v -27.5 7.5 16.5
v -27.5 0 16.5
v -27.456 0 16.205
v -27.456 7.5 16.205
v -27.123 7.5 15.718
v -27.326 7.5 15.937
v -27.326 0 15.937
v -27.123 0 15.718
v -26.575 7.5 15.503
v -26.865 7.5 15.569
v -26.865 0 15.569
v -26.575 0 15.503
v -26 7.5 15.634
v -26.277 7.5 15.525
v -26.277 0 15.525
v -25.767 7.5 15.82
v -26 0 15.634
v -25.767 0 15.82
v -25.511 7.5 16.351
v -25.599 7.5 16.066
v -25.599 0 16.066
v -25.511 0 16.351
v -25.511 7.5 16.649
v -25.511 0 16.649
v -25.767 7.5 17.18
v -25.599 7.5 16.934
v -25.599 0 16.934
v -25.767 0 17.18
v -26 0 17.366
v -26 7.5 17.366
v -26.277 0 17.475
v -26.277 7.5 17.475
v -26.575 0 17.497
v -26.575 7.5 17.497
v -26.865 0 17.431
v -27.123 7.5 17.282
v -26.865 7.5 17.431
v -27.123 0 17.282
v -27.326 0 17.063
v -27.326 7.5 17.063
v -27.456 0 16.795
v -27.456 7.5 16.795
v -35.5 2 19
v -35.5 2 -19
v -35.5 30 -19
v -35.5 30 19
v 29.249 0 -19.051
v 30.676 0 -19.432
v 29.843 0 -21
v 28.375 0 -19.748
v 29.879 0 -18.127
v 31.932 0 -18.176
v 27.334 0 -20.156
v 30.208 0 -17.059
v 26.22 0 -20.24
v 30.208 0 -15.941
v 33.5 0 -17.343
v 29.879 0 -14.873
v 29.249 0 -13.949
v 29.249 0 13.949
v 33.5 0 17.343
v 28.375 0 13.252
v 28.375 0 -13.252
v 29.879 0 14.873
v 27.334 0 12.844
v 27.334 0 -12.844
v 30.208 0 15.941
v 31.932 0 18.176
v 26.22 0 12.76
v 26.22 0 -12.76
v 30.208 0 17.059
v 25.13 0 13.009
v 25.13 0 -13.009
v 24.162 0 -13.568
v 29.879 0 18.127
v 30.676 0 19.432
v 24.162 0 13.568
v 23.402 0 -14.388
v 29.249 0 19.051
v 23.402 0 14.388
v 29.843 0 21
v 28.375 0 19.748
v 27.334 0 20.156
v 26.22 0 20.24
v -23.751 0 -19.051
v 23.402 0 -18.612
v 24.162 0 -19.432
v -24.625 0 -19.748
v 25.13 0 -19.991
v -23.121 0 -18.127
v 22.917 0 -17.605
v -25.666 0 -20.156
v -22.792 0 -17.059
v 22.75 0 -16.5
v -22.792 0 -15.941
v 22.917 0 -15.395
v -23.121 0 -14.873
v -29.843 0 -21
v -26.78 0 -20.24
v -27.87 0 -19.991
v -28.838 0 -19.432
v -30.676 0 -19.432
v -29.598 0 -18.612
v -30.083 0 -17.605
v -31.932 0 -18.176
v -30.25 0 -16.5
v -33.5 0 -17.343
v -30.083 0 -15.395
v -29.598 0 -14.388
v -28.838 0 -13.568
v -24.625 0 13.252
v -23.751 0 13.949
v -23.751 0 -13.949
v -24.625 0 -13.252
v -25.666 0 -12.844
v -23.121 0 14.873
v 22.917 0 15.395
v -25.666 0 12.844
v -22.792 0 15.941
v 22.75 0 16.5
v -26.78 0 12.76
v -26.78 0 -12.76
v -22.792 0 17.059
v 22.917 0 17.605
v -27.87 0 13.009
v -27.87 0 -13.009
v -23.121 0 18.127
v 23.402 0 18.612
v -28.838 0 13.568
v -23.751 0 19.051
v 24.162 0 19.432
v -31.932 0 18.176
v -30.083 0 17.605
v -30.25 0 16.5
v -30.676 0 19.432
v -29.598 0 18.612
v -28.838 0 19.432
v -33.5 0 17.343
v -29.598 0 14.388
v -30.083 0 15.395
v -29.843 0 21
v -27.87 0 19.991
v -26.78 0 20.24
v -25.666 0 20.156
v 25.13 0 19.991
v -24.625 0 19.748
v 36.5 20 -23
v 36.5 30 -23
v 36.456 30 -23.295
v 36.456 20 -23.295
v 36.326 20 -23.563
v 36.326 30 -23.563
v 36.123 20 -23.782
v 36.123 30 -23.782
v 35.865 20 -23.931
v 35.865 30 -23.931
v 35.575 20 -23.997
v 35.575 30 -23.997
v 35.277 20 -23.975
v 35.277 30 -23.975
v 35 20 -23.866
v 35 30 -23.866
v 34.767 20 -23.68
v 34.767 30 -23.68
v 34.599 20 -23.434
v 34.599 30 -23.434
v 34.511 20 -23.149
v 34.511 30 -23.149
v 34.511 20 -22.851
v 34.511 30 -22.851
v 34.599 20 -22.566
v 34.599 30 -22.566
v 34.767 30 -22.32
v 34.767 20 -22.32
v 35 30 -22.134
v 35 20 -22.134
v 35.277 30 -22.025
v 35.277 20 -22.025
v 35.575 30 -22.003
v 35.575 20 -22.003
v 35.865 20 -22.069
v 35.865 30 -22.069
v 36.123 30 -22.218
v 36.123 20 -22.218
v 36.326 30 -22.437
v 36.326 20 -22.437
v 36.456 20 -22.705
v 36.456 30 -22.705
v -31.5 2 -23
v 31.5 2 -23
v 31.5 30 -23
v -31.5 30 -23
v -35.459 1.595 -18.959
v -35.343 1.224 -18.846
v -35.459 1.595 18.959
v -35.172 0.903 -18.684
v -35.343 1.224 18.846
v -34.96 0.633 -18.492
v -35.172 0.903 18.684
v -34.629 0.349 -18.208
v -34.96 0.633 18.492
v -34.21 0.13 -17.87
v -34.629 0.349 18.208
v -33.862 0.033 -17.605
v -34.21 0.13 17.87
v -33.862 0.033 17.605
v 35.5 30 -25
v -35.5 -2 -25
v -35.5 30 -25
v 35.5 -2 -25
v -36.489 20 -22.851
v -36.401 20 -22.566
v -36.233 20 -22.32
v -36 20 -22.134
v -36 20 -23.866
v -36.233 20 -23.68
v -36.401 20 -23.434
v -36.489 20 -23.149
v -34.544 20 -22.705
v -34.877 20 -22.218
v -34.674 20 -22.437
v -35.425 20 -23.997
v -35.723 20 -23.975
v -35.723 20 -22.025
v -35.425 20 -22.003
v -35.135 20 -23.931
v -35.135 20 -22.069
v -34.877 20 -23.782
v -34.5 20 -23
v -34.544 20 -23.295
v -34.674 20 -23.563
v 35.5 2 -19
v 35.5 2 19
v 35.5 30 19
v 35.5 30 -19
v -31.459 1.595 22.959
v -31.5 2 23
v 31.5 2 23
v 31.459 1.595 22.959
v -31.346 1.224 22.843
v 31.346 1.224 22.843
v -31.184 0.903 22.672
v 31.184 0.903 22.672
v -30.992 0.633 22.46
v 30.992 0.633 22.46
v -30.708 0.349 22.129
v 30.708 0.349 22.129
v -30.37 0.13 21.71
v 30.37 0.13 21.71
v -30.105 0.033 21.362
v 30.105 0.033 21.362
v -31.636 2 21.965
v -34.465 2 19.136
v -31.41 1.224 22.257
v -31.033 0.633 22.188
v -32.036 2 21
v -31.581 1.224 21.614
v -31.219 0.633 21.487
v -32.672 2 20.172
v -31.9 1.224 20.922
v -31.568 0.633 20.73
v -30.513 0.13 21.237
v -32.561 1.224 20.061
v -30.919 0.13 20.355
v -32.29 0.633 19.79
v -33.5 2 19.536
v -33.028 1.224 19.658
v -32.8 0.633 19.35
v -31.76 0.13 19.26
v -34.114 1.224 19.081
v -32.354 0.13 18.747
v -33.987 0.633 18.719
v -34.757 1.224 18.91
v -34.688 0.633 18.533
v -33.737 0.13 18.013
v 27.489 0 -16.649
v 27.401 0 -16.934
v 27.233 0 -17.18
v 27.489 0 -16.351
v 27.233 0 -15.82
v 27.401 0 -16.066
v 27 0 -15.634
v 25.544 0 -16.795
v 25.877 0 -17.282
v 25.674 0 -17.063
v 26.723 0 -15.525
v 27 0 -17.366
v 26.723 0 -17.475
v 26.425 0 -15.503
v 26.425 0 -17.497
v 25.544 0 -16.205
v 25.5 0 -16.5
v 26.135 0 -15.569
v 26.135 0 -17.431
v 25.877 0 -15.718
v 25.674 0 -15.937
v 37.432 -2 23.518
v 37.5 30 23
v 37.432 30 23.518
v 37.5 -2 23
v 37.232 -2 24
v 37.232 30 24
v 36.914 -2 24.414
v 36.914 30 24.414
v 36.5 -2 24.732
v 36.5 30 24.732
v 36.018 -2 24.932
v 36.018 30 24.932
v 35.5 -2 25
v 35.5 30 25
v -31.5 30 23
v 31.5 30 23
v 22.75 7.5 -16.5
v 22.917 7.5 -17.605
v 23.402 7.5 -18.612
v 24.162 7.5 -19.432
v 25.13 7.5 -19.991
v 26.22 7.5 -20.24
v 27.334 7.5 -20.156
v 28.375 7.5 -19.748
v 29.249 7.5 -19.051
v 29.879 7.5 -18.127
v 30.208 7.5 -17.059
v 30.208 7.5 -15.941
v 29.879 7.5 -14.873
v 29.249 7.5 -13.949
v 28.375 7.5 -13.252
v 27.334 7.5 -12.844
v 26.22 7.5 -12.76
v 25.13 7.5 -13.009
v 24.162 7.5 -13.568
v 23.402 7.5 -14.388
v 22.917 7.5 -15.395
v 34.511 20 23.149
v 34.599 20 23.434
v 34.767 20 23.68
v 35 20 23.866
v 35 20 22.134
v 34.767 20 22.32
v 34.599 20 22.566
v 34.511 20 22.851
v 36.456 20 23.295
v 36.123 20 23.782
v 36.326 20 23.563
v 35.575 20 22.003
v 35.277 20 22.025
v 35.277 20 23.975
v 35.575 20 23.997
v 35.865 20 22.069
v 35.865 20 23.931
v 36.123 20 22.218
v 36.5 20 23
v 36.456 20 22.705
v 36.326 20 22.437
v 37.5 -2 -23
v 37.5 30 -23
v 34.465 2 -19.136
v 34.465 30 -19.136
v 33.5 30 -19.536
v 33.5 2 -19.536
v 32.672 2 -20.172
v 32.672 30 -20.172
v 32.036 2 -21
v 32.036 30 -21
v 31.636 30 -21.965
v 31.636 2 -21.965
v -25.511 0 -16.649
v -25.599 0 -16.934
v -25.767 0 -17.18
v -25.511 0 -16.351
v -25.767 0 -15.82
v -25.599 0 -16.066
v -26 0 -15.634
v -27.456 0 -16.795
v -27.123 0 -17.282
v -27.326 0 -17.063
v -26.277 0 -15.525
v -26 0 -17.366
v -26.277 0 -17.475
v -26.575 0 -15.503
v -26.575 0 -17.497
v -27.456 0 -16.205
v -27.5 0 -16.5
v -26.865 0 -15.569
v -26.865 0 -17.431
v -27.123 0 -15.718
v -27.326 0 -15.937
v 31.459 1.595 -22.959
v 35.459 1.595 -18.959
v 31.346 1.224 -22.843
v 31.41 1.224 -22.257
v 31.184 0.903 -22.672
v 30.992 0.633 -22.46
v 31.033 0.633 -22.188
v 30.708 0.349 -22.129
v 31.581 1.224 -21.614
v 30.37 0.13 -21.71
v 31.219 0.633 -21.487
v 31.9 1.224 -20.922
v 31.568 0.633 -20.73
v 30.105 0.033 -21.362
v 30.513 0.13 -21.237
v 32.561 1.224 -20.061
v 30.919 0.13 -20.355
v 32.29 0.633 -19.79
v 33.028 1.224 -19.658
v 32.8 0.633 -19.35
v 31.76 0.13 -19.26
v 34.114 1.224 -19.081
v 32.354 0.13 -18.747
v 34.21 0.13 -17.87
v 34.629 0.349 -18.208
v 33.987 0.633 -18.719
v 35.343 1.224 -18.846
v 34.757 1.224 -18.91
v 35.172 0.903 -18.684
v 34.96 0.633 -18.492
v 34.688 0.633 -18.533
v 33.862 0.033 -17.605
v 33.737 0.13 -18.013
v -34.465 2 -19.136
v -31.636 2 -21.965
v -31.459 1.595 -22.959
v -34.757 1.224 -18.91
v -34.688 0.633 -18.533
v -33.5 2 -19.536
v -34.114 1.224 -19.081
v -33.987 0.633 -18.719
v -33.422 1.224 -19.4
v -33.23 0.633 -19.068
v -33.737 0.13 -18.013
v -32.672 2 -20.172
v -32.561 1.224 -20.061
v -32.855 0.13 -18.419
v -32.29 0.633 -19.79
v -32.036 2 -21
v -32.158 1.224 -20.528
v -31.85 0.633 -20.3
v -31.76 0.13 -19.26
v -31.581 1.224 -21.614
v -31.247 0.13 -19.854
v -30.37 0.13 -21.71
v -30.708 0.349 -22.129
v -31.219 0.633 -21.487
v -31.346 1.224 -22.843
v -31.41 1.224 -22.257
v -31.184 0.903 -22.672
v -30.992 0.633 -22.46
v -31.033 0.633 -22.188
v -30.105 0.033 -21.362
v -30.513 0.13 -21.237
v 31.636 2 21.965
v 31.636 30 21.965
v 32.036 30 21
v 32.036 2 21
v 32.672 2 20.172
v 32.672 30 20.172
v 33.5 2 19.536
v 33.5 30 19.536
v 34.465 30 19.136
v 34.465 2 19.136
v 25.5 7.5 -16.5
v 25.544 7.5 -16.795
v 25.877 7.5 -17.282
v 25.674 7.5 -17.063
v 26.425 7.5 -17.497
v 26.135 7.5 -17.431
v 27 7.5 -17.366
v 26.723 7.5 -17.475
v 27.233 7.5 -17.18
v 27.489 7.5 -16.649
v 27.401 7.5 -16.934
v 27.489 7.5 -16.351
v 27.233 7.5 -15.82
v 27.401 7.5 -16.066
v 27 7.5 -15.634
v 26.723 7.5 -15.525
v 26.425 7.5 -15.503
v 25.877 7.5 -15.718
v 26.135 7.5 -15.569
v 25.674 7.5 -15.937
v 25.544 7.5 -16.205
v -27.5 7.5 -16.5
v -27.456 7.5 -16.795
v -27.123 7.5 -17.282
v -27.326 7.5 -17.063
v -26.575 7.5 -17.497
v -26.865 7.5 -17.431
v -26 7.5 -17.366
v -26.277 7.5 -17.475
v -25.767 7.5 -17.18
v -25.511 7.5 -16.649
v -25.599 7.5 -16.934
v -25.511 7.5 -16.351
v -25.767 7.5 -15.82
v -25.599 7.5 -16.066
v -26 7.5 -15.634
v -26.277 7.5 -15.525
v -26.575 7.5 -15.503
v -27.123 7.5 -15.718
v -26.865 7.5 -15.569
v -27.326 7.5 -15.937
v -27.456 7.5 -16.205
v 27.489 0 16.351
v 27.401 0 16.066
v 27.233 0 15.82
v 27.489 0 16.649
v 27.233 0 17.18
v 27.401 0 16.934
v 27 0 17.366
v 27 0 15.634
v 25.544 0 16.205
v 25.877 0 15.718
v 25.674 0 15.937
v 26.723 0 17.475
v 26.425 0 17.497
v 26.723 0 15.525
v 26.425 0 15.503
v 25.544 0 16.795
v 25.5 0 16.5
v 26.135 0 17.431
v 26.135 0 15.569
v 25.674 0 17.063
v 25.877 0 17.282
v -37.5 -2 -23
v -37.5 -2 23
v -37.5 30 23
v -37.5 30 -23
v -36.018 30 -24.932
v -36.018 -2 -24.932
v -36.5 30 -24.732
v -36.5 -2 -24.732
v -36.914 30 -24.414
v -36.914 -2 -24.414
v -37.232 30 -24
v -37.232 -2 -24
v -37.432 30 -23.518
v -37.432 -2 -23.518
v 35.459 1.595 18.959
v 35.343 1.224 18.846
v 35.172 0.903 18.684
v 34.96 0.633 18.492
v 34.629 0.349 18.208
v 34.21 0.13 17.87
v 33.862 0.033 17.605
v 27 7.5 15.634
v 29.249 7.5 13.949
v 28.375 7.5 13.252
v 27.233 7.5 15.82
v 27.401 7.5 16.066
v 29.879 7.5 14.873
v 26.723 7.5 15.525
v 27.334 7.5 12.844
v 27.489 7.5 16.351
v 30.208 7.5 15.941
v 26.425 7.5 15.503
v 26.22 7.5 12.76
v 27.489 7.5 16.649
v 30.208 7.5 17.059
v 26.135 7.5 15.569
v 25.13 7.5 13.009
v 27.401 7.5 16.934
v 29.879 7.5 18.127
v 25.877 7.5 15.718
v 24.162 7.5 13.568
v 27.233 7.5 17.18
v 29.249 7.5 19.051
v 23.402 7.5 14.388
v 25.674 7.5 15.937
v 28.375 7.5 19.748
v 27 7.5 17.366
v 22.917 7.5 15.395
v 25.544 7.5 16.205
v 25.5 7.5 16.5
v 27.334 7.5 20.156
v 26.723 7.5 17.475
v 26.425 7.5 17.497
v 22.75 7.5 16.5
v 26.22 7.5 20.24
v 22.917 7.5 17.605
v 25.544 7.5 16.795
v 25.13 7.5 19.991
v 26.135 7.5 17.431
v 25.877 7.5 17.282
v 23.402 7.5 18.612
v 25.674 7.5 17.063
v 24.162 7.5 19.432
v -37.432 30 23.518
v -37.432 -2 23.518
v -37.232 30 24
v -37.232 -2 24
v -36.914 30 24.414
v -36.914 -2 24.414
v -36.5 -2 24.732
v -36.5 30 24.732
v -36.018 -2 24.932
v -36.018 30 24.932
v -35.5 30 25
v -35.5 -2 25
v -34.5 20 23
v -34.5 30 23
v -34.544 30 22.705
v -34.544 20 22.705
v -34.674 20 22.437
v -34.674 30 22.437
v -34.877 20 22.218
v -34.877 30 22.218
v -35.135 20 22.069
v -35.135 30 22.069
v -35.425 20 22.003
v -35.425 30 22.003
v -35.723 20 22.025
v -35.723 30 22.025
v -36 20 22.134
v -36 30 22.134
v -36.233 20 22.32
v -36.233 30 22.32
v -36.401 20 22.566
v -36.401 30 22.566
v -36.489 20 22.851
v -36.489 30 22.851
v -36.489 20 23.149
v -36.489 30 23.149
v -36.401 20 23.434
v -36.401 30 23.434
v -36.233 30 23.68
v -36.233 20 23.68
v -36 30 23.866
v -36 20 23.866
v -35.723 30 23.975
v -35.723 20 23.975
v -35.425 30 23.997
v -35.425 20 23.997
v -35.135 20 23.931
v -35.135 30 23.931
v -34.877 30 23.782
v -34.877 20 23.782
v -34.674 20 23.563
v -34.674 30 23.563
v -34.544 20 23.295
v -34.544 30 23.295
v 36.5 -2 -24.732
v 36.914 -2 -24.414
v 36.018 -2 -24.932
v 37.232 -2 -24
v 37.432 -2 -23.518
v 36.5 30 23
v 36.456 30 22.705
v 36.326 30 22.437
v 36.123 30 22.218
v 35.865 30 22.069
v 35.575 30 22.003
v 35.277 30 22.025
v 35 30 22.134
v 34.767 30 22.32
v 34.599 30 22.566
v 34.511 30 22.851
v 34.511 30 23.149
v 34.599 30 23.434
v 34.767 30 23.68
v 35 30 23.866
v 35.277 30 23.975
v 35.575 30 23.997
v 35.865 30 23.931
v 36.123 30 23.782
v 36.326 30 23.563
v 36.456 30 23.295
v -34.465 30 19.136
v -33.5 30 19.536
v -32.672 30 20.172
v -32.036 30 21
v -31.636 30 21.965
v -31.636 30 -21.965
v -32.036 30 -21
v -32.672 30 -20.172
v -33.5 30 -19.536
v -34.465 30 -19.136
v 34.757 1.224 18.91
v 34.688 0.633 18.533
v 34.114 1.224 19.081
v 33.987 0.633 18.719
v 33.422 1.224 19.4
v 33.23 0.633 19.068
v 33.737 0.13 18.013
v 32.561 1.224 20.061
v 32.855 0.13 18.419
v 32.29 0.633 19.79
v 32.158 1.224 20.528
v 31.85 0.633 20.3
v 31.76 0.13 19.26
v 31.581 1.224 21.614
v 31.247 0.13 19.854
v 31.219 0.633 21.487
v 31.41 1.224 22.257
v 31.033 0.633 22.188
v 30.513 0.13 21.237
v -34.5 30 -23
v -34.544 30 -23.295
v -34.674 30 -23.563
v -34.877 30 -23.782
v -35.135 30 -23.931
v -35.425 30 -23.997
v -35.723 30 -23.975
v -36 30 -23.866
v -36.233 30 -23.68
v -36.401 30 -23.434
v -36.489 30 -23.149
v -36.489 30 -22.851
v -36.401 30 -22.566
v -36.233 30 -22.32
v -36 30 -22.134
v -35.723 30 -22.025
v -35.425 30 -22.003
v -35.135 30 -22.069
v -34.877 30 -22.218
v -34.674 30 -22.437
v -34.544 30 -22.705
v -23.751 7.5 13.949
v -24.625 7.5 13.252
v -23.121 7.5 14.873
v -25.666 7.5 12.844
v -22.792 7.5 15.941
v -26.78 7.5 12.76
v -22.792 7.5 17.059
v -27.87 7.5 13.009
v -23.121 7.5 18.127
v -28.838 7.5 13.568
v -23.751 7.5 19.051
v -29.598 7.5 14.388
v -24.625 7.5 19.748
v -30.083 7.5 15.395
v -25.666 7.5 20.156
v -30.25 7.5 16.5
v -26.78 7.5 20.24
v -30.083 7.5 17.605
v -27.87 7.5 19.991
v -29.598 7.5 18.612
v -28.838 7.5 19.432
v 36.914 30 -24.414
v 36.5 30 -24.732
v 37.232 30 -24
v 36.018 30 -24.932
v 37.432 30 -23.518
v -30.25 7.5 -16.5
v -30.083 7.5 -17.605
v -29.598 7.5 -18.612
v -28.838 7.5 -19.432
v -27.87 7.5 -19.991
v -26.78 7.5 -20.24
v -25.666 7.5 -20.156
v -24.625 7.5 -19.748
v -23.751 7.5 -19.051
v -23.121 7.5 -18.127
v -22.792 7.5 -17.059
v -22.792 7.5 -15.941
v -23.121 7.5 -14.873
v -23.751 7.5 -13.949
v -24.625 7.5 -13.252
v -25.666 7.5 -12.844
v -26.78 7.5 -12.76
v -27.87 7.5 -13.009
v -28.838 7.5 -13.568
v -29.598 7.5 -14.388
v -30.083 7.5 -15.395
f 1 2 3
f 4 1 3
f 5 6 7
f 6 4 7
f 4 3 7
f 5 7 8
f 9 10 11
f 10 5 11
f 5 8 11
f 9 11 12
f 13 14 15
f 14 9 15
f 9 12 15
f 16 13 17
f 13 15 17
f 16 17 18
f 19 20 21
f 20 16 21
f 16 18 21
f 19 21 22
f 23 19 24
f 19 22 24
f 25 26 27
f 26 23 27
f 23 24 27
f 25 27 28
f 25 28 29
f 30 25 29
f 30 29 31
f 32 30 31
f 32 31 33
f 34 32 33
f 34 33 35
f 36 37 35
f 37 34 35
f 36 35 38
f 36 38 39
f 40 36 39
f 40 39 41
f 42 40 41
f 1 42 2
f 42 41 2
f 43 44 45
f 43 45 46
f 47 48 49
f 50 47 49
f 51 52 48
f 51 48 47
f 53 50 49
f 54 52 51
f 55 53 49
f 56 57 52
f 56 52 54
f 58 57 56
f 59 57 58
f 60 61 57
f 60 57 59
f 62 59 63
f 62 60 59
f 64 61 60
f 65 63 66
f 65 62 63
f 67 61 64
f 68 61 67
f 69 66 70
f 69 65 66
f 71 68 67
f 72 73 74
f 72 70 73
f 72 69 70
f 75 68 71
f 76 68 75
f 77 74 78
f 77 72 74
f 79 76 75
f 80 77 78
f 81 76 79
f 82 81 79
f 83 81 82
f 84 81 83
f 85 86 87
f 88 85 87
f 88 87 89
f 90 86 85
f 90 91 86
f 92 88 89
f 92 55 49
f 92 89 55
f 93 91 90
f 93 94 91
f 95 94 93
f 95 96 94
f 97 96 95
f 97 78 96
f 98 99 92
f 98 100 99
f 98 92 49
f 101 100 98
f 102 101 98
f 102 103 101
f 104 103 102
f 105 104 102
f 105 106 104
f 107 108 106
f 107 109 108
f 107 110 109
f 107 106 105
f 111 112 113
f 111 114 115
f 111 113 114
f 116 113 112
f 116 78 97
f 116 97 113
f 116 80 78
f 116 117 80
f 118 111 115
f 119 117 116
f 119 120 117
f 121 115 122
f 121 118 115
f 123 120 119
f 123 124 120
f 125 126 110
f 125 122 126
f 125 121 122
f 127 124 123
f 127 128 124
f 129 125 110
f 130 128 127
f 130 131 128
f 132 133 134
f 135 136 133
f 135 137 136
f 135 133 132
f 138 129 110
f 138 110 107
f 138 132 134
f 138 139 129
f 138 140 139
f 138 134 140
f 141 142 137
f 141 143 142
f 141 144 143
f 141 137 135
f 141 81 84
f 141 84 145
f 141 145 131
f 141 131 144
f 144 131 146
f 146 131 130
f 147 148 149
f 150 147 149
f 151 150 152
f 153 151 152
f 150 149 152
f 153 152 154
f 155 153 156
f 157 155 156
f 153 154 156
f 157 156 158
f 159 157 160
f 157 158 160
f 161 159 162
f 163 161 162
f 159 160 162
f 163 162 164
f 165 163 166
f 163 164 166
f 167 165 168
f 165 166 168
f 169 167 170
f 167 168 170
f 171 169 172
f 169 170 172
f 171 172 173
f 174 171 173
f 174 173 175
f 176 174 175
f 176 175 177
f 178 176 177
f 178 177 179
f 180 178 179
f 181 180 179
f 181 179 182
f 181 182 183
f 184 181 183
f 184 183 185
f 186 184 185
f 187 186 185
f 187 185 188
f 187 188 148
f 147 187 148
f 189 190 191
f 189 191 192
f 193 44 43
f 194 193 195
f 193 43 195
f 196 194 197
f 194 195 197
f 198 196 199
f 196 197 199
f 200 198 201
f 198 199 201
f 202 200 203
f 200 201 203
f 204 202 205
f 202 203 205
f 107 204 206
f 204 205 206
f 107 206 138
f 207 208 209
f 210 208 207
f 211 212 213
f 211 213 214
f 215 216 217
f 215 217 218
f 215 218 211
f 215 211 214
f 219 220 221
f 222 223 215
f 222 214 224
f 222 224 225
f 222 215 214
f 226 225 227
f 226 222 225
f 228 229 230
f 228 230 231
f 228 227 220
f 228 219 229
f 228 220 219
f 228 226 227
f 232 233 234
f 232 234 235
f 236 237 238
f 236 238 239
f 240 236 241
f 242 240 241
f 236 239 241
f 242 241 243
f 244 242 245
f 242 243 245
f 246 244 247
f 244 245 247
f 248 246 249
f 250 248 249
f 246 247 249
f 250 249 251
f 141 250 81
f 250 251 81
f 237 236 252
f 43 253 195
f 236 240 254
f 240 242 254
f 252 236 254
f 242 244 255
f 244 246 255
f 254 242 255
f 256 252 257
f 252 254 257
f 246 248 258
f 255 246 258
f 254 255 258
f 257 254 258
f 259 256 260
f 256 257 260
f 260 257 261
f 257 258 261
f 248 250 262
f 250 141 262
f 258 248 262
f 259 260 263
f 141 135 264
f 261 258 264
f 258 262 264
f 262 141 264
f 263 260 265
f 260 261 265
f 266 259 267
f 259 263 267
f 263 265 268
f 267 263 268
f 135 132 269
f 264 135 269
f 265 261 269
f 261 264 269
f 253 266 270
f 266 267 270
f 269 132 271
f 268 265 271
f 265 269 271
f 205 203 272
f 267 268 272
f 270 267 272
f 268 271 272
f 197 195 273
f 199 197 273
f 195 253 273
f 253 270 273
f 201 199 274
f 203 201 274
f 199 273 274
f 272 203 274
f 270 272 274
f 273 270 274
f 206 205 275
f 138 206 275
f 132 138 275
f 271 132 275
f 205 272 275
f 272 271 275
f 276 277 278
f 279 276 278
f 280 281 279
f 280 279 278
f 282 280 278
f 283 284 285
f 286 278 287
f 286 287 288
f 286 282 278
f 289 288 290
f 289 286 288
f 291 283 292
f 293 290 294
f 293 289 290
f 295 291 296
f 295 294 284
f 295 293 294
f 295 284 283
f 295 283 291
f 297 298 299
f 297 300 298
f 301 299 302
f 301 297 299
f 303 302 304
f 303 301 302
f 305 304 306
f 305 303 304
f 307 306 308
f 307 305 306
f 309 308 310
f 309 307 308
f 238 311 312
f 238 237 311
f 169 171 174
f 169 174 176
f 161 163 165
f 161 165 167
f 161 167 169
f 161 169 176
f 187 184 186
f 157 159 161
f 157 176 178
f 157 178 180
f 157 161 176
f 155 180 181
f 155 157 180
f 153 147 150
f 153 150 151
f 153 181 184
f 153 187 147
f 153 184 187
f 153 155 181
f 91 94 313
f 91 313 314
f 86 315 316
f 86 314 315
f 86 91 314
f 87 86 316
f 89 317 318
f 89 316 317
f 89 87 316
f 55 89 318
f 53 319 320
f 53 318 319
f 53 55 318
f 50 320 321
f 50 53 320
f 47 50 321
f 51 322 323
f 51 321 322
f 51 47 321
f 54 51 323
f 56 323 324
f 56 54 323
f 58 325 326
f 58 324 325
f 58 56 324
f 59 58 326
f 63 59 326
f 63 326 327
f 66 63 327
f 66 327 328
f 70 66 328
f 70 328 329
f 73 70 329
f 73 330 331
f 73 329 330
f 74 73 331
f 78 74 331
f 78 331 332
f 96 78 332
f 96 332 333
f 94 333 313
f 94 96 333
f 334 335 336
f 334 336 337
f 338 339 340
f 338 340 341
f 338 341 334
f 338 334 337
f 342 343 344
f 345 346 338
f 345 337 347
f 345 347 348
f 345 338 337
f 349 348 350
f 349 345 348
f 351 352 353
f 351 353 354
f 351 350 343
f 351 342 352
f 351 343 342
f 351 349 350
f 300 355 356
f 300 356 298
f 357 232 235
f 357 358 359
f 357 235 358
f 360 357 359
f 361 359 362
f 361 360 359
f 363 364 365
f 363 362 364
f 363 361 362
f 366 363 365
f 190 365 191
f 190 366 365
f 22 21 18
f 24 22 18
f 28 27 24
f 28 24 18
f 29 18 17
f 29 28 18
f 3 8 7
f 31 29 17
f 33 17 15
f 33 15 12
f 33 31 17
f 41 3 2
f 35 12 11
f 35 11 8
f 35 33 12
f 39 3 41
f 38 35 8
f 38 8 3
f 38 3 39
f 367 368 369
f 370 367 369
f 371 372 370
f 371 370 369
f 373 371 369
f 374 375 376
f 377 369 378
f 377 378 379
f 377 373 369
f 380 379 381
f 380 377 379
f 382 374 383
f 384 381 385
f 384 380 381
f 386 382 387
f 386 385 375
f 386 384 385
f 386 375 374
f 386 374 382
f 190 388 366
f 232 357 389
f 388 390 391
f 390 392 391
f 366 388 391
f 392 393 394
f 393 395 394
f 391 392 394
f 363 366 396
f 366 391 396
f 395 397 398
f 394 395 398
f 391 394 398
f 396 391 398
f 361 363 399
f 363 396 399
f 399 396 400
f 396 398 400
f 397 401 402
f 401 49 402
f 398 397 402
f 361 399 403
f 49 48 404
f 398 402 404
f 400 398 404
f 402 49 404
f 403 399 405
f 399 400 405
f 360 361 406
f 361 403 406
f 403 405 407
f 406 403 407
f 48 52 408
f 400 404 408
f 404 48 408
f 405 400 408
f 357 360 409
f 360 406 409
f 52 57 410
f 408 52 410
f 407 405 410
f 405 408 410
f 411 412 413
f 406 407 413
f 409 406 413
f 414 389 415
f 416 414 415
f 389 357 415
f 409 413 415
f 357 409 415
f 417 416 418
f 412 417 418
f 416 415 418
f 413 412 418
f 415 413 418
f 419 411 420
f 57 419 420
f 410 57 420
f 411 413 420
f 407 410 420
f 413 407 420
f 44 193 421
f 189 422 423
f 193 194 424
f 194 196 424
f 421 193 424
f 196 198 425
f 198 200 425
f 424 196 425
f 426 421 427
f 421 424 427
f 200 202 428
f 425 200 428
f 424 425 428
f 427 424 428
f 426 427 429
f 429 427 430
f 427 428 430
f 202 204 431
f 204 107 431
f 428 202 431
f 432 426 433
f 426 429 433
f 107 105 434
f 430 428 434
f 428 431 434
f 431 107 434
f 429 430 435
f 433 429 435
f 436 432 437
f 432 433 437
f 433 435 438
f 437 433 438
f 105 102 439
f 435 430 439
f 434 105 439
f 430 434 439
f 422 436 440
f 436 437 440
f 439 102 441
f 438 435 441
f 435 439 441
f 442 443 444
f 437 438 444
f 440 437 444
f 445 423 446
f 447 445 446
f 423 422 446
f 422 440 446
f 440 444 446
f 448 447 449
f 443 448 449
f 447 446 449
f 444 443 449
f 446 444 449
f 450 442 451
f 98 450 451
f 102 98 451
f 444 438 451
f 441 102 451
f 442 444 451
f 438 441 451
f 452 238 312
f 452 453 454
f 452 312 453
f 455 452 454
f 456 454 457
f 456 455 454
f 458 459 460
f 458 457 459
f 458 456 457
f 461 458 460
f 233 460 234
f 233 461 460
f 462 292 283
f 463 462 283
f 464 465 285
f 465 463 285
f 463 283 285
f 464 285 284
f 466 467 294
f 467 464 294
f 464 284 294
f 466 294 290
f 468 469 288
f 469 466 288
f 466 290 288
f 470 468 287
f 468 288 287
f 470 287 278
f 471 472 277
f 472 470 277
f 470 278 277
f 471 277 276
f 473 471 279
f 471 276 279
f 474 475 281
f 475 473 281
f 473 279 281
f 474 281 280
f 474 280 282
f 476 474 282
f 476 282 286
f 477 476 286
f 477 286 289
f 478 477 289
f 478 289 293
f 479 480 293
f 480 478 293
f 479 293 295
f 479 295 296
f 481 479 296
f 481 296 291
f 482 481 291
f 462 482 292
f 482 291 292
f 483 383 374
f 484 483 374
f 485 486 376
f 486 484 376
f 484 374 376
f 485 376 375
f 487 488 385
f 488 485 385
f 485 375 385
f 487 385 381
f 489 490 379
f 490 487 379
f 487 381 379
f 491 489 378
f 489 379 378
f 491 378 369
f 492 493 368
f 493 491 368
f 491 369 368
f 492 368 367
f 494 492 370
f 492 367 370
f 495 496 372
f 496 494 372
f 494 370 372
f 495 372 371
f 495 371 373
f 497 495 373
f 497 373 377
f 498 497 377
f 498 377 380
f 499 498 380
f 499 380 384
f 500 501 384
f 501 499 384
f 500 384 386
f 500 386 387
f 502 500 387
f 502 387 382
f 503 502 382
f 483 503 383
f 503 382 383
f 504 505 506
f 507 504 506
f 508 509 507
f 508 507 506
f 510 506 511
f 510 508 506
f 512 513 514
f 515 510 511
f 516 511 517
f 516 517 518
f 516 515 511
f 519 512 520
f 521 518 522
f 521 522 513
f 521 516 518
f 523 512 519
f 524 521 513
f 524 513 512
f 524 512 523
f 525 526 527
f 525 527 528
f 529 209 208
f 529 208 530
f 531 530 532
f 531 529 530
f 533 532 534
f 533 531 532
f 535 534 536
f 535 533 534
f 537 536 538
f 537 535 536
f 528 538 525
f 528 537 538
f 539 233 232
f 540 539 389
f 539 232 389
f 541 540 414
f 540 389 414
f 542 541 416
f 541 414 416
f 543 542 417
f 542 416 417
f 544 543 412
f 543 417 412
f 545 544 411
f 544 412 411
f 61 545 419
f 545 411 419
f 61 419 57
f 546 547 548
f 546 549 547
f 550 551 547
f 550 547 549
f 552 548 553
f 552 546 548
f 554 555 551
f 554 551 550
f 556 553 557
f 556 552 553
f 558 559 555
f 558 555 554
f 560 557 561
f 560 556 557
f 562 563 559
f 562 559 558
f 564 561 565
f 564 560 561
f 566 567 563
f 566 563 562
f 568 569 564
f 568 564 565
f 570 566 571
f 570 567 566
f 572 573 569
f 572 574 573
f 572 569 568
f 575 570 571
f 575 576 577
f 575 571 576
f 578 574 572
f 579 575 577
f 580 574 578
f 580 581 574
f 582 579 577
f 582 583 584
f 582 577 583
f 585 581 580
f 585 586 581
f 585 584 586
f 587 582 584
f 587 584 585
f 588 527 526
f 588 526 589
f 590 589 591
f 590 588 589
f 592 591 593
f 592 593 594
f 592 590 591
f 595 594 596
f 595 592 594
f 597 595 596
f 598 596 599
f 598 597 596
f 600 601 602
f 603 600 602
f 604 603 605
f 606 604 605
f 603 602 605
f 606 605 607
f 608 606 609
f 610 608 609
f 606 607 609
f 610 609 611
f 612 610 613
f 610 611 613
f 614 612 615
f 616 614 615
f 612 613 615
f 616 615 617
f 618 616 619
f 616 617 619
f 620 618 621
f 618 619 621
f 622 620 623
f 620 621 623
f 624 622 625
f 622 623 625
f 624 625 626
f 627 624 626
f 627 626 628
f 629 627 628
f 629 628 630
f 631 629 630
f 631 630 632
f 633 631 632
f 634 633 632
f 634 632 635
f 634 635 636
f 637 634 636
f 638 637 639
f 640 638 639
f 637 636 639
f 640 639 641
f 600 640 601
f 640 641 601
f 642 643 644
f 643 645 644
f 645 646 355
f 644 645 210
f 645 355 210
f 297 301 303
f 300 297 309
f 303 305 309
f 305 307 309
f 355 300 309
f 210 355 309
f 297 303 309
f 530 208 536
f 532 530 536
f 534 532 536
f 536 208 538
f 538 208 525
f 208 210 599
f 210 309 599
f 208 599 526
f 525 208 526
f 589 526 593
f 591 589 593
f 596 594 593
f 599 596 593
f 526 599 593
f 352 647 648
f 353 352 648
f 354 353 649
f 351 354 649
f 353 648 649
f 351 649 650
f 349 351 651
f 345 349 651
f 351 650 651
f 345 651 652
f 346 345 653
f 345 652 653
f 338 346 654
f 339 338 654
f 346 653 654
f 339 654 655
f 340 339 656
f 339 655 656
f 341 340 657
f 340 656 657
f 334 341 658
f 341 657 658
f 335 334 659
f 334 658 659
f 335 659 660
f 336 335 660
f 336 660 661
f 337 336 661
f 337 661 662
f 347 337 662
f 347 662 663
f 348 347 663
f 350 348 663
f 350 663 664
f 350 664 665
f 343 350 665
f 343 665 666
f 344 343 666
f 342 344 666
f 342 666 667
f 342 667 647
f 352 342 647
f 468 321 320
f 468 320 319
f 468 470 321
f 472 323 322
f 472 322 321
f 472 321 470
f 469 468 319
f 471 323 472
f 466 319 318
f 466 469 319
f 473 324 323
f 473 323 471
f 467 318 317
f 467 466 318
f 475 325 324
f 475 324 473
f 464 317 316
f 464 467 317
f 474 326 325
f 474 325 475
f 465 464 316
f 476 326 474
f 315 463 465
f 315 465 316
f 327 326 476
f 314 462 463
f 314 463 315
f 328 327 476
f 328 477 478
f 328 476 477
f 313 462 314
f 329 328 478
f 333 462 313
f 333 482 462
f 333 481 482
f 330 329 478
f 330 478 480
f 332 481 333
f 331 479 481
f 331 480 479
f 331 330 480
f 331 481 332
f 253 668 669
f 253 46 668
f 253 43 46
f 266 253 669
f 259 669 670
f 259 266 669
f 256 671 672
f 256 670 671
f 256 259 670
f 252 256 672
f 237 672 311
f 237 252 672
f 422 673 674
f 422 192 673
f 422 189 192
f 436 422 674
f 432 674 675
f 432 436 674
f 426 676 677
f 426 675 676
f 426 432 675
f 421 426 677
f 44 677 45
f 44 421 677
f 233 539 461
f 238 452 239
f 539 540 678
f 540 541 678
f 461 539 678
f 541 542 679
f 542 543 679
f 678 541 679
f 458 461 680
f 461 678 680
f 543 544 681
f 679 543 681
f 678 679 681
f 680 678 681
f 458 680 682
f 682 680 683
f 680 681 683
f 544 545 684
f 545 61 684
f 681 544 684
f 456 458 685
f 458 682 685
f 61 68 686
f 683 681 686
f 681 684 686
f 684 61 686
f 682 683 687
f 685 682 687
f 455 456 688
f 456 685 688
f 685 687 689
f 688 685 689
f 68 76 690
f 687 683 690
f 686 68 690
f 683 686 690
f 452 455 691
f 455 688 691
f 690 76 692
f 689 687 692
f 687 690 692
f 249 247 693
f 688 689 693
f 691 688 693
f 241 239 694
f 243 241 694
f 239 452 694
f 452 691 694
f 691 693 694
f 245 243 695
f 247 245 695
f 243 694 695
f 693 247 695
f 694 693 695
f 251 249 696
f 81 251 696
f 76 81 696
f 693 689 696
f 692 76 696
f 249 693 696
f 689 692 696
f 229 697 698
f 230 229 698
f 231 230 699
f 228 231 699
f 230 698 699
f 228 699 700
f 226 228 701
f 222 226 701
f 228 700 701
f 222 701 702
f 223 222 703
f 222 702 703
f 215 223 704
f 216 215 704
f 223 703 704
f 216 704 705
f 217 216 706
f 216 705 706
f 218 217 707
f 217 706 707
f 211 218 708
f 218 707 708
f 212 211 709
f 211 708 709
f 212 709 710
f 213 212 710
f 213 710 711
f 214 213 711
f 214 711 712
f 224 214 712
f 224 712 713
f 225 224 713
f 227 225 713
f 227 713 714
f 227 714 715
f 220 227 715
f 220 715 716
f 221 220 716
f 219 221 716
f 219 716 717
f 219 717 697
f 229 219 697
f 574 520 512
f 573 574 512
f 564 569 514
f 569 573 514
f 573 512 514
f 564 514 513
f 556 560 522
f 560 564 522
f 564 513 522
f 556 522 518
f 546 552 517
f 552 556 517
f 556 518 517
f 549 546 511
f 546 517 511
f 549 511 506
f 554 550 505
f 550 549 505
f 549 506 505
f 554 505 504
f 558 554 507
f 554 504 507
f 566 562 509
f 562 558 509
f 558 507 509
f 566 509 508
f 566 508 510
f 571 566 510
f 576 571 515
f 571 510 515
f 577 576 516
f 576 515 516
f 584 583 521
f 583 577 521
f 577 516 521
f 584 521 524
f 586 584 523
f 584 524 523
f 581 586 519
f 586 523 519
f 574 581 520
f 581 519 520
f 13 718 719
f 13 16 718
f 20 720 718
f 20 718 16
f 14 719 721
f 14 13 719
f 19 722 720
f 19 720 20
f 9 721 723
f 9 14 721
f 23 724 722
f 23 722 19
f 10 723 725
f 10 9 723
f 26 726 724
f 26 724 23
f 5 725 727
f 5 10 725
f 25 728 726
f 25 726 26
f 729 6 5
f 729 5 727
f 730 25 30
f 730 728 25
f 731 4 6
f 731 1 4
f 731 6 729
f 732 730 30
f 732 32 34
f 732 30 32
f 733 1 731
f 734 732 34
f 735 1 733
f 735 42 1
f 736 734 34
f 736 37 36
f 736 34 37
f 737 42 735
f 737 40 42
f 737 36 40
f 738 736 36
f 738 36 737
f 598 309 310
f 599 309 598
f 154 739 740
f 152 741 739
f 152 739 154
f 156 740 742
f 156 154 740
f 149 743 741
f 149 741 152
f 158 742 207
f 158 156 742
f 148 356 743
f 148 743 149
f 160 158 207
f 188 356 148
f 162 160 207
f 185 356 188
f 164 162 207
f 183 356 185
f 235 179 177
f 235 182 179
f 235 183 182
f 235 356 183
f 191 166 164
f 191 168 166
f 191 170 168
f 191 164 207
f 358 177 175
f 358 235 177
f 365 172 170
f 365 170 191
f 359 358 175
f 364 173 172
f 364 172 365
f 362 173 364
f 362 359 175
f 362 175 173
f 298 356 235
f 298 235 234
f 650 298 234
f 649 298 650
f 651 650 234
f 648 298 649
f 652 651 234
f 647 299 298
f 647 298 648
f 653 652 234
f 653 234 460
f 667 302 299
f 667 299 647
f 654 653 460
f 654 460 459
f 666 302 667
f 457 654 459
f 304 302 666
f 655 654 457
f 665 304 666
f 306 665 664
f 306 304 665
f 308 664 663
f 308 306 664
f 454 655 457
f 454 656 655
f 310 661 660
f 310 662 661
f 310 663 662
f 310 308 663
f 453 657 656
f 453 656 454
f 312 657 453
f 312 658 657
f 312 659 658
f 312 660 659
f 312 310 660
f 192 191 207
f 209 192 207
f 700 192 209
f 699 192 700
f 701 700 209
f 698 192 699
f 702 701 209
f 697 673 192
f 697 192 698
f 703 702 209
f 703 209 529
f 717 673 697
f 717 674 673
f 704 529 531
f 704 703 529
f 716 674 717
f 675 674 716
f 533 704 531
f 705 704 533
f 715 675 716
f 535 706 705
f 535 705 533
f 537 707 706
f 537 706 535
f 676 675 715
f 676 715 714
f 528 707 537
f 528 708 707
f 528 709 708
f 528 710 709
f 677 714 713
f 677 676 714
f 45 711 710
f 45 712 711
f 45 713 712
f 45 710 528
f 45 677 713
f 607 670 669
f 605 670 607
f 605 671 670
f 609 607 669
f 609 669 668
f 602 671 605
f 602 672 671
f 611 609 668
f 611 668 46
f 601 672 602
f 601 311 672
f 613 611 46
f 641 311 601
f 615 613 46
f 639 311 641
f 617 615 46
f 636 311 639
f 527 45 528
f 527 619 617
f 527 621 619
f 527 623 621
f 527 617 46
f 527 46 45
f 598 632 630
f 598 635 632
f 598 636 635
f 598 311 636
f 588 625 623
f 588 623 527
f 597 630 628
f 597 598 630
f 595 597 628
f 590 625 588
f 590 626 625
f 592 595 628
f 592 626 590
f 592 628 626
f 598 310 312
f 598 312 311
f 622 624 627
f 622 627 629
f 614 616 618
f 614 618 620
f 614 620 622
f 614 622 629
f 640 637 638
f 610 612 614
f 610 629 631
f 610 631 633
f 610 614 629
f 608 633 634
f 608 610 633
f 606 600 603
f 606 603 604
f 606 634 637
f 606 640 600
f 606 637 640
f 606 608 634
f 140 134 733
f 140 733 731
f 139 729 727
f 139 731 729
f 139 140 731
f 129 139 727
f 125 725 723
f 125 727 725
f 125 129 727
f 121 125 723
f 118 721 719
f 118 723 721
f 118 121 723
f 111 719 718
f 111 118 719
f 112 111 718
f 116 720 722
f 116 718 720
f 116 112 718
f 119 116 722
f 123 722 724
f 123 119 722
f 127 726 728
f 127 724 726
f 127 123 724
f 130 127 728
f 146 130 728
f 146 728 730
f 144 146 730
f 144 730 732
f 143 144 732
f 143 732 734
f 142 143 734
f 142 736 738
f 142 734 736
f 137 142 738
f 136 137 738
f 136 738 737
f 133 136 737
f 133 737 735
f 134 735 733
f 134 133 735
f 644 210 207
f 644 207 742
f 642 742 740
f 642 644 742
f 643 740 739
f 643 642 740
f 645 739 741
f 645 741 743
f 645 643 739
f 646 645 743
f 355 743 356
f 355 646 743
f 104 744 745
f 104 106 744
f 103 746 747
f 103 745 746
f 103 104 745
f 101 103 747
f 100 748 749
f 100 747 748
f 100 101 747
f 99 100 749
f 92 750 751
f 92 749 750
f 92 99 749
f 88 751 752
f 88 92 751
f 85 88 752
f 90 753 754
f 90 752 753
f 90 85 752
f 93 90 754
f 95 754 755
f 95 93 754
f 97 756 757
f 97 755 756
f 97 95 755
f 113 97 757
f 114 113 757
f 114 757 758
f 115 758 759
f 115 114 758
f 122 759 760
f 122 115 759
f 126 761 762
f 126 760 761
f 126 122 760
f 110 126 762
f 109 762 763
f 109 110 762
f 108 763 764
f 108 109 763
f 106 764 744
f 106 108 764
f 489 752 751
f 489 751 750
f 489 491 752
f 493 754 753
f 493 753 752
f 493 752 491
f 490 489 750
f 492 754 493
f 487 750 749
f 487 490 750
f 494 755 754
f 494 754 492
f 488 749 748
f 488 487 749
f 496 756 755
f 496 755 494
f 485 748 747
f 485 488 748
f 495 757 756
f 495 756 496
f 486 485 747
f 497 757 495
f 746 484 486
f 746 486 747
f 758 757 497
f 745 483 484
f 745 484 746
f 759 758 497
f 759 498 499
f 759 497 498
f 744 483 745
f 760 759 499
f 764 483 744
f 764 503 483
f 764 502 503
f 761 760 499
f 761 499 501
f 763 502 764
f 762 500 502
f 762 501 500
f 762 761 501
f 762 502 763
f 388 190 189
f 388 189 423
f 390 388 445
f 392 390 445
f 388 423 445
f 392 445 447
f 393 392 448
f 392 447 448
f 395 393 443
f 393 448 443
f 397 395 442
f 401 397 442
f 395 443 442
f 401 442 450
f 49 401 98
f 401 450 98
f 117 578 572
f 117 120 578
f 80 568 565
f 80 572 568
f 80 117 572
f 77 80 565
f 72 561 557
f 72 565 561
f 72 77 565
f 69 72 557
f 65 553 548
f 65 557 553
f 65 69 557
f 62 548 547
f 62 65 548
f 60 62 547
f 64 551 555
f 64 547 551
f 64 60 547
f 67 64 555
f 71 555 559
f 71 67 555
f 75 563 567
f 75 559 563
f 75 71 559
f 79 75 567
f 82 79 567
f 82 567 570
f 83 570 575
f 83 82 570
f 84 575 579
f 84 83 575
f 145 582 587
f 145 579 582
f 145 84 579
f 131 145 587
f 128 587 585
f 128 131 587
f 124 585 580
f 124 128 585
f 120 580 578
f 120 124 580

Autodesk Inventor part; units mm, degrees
ref_plane "YZ Plane" through (0, 0, 0) normal (1, 0, 0) x (0, 1, 0)
ref_plane "XZ Plane" through (0, 0, 0) normal (0, 1, 0) x (-1, 0, 0)
ref_plane "XY Plane" through (0, 0, 0) normal (0, 0, 1) x (1, 0, 0)
sketch "Sketch1" plane through (0, 0, 0) normal (0, 1, 0) x (-1, 0, 0)
  line L0 (26.5, 16.5) -> (-26.5, 16.5) construction
  line L1 (-26.5, 16.5) -> (-26.5, -16.5) construction
  line L2 (-26.5, -16.5) -> (26.5, -16.5) construction
  line L3 (26.5, -16.5) -> (26.5, 16.5) construction
  line L4 (26.5, -16.5) -> (-26.5, 16.5) construction
  circle A0 centre (26.5, 16.5) radius 1
  circle A1 centre (26.5, -16.5) radius 1
  circle A2 centre (-26.5, 16.5) radius 1
  circle A3 centre (-26.5, -16.5) radius 1
  circle A4 centre (26.5, 16.5) radius 3.75
  circle A5 centre (26.5, -16.5) radius 3.75
  circle A6 centre (-26.5, -16.5) radius 3.75
  circle A7 centre (-26.5, 16.5) radius 3.75
  point P0 (0, 0)
  point P1 (0, 0)
  dimension "d0" = 33
  dimension "d1" = 53
  dimension "d2" = 2
  dimension "d3" = 7.5
extrude "Extrusion1" add sketch "Sketch1" along normal blind 7.5
sketch "Sketch2" plane through (0, 0, 0) normal (0, 1, 0) x (-1, 0, 0)
  line L0 (37.5, -25) -> (-37.5, -25)
  line L1 (-37.5, -25) -> (-37.5, 25)
  line L2 (-37.5, 25) -> (37.5, 25)
  line L3 (37.5, 25) -> (37.5, -25)
  line L4 (37.5, 25) -> (-37.5, -25) construction
  line L5 (35.5, -19) -> (35.5, 19)
  line L6 (-35.5, 19) -> (-35.5, -19)
  circle A0 centre (-26.5, -16.5) radius 1 projected
  circle A1 centre (26.5, -16.5) radius 3.75 projected
  circle A2 centre (26.5, 16.5) radius 3.75 projected
  circle A3 centre (-26.5, 16.5) radius 3.75 projected
  arc A4 (35.5, -19) -> (31.5, -23) centre (35.5, -23) ccw
  arc A5 (31.5, 23) -> (35.5, 19) centre (35.5, 23) ccw
  arc A6 (-35.5, 19) -> (-31.5, 23) centre (-35.5, 23) ccw
  arc A7 (-31.5, -23) -> (-35.5, -19) centre (-35.5, -23) ccw
  line L7 (-31.5, -23) -> (31.5, -23)
  line L8 (31.5, 23) -> (-31.5, 23)
  point P0 (0, 0)
  point P1 (0, 0)
  dimension "d6" = 75
  dimension "d10" = 50
  dimension "d11" = 2
  dimension "d129" = 4
  dimension "d132" = 2
  dimension "d133" = 2
  dimension "d134" = 2
extrude "Extrusion7" add sketch "Sketch2" against normal blind 2 contours L0 L1 L2 L3 | A4 L7 A7 L6 A6 L8 A5 L5 | A0 | A1 | A2 | A3
extrude "Extrusion8" add sketch "Sketch2" along normal blind 30 contours L0 L1 L2 L3
sketch "Sketch6" plane through (0, 30, 0) normal (0, 1, 0) x (1, 0, 0)
  circle A0 centre (-35.5, 23) radius 1
  line L0 (-32.6716, 23) -> (32.6716, 23) projected
  line L1 (-35.5, -20.1716) -> (-35.5, 20.1716) projected
  circle A1 centre (35.5, 23) radius 1
  circle A2 centre (35.5, -23) radius 1
  circle A3 centre (-35.5, -23) radius 1
  line L2 (35.5, 20.1716) -> (35.5, -20.1716) projected
  line L3 (32.6716, -23) -> (-32.6716, -23) projected
  point P0 (0, 0)
  dimension "d24" = 2
extrude "Extrusion9" cut sketch "Sketch6" against normal blind 10
fillet "Fillet2" radius 2 4 edges at (-37.5, 14, -25) (-37.5, 14, 25) (37.5, 14, 25) (37.5, 14, -25)
fillet "Fillet3" radius 2 8 edges at (32.6716, 0, 20.1716) (35.5, 0, 0) (32.6716, 0, -20.1716) (0, 0, -23) (-32.6716, 0, -20.1716) (-35.5, 0, 0) (-32.6716, 0, 20.1716) (0, 0, 23)
properties part number "Enclosure"
